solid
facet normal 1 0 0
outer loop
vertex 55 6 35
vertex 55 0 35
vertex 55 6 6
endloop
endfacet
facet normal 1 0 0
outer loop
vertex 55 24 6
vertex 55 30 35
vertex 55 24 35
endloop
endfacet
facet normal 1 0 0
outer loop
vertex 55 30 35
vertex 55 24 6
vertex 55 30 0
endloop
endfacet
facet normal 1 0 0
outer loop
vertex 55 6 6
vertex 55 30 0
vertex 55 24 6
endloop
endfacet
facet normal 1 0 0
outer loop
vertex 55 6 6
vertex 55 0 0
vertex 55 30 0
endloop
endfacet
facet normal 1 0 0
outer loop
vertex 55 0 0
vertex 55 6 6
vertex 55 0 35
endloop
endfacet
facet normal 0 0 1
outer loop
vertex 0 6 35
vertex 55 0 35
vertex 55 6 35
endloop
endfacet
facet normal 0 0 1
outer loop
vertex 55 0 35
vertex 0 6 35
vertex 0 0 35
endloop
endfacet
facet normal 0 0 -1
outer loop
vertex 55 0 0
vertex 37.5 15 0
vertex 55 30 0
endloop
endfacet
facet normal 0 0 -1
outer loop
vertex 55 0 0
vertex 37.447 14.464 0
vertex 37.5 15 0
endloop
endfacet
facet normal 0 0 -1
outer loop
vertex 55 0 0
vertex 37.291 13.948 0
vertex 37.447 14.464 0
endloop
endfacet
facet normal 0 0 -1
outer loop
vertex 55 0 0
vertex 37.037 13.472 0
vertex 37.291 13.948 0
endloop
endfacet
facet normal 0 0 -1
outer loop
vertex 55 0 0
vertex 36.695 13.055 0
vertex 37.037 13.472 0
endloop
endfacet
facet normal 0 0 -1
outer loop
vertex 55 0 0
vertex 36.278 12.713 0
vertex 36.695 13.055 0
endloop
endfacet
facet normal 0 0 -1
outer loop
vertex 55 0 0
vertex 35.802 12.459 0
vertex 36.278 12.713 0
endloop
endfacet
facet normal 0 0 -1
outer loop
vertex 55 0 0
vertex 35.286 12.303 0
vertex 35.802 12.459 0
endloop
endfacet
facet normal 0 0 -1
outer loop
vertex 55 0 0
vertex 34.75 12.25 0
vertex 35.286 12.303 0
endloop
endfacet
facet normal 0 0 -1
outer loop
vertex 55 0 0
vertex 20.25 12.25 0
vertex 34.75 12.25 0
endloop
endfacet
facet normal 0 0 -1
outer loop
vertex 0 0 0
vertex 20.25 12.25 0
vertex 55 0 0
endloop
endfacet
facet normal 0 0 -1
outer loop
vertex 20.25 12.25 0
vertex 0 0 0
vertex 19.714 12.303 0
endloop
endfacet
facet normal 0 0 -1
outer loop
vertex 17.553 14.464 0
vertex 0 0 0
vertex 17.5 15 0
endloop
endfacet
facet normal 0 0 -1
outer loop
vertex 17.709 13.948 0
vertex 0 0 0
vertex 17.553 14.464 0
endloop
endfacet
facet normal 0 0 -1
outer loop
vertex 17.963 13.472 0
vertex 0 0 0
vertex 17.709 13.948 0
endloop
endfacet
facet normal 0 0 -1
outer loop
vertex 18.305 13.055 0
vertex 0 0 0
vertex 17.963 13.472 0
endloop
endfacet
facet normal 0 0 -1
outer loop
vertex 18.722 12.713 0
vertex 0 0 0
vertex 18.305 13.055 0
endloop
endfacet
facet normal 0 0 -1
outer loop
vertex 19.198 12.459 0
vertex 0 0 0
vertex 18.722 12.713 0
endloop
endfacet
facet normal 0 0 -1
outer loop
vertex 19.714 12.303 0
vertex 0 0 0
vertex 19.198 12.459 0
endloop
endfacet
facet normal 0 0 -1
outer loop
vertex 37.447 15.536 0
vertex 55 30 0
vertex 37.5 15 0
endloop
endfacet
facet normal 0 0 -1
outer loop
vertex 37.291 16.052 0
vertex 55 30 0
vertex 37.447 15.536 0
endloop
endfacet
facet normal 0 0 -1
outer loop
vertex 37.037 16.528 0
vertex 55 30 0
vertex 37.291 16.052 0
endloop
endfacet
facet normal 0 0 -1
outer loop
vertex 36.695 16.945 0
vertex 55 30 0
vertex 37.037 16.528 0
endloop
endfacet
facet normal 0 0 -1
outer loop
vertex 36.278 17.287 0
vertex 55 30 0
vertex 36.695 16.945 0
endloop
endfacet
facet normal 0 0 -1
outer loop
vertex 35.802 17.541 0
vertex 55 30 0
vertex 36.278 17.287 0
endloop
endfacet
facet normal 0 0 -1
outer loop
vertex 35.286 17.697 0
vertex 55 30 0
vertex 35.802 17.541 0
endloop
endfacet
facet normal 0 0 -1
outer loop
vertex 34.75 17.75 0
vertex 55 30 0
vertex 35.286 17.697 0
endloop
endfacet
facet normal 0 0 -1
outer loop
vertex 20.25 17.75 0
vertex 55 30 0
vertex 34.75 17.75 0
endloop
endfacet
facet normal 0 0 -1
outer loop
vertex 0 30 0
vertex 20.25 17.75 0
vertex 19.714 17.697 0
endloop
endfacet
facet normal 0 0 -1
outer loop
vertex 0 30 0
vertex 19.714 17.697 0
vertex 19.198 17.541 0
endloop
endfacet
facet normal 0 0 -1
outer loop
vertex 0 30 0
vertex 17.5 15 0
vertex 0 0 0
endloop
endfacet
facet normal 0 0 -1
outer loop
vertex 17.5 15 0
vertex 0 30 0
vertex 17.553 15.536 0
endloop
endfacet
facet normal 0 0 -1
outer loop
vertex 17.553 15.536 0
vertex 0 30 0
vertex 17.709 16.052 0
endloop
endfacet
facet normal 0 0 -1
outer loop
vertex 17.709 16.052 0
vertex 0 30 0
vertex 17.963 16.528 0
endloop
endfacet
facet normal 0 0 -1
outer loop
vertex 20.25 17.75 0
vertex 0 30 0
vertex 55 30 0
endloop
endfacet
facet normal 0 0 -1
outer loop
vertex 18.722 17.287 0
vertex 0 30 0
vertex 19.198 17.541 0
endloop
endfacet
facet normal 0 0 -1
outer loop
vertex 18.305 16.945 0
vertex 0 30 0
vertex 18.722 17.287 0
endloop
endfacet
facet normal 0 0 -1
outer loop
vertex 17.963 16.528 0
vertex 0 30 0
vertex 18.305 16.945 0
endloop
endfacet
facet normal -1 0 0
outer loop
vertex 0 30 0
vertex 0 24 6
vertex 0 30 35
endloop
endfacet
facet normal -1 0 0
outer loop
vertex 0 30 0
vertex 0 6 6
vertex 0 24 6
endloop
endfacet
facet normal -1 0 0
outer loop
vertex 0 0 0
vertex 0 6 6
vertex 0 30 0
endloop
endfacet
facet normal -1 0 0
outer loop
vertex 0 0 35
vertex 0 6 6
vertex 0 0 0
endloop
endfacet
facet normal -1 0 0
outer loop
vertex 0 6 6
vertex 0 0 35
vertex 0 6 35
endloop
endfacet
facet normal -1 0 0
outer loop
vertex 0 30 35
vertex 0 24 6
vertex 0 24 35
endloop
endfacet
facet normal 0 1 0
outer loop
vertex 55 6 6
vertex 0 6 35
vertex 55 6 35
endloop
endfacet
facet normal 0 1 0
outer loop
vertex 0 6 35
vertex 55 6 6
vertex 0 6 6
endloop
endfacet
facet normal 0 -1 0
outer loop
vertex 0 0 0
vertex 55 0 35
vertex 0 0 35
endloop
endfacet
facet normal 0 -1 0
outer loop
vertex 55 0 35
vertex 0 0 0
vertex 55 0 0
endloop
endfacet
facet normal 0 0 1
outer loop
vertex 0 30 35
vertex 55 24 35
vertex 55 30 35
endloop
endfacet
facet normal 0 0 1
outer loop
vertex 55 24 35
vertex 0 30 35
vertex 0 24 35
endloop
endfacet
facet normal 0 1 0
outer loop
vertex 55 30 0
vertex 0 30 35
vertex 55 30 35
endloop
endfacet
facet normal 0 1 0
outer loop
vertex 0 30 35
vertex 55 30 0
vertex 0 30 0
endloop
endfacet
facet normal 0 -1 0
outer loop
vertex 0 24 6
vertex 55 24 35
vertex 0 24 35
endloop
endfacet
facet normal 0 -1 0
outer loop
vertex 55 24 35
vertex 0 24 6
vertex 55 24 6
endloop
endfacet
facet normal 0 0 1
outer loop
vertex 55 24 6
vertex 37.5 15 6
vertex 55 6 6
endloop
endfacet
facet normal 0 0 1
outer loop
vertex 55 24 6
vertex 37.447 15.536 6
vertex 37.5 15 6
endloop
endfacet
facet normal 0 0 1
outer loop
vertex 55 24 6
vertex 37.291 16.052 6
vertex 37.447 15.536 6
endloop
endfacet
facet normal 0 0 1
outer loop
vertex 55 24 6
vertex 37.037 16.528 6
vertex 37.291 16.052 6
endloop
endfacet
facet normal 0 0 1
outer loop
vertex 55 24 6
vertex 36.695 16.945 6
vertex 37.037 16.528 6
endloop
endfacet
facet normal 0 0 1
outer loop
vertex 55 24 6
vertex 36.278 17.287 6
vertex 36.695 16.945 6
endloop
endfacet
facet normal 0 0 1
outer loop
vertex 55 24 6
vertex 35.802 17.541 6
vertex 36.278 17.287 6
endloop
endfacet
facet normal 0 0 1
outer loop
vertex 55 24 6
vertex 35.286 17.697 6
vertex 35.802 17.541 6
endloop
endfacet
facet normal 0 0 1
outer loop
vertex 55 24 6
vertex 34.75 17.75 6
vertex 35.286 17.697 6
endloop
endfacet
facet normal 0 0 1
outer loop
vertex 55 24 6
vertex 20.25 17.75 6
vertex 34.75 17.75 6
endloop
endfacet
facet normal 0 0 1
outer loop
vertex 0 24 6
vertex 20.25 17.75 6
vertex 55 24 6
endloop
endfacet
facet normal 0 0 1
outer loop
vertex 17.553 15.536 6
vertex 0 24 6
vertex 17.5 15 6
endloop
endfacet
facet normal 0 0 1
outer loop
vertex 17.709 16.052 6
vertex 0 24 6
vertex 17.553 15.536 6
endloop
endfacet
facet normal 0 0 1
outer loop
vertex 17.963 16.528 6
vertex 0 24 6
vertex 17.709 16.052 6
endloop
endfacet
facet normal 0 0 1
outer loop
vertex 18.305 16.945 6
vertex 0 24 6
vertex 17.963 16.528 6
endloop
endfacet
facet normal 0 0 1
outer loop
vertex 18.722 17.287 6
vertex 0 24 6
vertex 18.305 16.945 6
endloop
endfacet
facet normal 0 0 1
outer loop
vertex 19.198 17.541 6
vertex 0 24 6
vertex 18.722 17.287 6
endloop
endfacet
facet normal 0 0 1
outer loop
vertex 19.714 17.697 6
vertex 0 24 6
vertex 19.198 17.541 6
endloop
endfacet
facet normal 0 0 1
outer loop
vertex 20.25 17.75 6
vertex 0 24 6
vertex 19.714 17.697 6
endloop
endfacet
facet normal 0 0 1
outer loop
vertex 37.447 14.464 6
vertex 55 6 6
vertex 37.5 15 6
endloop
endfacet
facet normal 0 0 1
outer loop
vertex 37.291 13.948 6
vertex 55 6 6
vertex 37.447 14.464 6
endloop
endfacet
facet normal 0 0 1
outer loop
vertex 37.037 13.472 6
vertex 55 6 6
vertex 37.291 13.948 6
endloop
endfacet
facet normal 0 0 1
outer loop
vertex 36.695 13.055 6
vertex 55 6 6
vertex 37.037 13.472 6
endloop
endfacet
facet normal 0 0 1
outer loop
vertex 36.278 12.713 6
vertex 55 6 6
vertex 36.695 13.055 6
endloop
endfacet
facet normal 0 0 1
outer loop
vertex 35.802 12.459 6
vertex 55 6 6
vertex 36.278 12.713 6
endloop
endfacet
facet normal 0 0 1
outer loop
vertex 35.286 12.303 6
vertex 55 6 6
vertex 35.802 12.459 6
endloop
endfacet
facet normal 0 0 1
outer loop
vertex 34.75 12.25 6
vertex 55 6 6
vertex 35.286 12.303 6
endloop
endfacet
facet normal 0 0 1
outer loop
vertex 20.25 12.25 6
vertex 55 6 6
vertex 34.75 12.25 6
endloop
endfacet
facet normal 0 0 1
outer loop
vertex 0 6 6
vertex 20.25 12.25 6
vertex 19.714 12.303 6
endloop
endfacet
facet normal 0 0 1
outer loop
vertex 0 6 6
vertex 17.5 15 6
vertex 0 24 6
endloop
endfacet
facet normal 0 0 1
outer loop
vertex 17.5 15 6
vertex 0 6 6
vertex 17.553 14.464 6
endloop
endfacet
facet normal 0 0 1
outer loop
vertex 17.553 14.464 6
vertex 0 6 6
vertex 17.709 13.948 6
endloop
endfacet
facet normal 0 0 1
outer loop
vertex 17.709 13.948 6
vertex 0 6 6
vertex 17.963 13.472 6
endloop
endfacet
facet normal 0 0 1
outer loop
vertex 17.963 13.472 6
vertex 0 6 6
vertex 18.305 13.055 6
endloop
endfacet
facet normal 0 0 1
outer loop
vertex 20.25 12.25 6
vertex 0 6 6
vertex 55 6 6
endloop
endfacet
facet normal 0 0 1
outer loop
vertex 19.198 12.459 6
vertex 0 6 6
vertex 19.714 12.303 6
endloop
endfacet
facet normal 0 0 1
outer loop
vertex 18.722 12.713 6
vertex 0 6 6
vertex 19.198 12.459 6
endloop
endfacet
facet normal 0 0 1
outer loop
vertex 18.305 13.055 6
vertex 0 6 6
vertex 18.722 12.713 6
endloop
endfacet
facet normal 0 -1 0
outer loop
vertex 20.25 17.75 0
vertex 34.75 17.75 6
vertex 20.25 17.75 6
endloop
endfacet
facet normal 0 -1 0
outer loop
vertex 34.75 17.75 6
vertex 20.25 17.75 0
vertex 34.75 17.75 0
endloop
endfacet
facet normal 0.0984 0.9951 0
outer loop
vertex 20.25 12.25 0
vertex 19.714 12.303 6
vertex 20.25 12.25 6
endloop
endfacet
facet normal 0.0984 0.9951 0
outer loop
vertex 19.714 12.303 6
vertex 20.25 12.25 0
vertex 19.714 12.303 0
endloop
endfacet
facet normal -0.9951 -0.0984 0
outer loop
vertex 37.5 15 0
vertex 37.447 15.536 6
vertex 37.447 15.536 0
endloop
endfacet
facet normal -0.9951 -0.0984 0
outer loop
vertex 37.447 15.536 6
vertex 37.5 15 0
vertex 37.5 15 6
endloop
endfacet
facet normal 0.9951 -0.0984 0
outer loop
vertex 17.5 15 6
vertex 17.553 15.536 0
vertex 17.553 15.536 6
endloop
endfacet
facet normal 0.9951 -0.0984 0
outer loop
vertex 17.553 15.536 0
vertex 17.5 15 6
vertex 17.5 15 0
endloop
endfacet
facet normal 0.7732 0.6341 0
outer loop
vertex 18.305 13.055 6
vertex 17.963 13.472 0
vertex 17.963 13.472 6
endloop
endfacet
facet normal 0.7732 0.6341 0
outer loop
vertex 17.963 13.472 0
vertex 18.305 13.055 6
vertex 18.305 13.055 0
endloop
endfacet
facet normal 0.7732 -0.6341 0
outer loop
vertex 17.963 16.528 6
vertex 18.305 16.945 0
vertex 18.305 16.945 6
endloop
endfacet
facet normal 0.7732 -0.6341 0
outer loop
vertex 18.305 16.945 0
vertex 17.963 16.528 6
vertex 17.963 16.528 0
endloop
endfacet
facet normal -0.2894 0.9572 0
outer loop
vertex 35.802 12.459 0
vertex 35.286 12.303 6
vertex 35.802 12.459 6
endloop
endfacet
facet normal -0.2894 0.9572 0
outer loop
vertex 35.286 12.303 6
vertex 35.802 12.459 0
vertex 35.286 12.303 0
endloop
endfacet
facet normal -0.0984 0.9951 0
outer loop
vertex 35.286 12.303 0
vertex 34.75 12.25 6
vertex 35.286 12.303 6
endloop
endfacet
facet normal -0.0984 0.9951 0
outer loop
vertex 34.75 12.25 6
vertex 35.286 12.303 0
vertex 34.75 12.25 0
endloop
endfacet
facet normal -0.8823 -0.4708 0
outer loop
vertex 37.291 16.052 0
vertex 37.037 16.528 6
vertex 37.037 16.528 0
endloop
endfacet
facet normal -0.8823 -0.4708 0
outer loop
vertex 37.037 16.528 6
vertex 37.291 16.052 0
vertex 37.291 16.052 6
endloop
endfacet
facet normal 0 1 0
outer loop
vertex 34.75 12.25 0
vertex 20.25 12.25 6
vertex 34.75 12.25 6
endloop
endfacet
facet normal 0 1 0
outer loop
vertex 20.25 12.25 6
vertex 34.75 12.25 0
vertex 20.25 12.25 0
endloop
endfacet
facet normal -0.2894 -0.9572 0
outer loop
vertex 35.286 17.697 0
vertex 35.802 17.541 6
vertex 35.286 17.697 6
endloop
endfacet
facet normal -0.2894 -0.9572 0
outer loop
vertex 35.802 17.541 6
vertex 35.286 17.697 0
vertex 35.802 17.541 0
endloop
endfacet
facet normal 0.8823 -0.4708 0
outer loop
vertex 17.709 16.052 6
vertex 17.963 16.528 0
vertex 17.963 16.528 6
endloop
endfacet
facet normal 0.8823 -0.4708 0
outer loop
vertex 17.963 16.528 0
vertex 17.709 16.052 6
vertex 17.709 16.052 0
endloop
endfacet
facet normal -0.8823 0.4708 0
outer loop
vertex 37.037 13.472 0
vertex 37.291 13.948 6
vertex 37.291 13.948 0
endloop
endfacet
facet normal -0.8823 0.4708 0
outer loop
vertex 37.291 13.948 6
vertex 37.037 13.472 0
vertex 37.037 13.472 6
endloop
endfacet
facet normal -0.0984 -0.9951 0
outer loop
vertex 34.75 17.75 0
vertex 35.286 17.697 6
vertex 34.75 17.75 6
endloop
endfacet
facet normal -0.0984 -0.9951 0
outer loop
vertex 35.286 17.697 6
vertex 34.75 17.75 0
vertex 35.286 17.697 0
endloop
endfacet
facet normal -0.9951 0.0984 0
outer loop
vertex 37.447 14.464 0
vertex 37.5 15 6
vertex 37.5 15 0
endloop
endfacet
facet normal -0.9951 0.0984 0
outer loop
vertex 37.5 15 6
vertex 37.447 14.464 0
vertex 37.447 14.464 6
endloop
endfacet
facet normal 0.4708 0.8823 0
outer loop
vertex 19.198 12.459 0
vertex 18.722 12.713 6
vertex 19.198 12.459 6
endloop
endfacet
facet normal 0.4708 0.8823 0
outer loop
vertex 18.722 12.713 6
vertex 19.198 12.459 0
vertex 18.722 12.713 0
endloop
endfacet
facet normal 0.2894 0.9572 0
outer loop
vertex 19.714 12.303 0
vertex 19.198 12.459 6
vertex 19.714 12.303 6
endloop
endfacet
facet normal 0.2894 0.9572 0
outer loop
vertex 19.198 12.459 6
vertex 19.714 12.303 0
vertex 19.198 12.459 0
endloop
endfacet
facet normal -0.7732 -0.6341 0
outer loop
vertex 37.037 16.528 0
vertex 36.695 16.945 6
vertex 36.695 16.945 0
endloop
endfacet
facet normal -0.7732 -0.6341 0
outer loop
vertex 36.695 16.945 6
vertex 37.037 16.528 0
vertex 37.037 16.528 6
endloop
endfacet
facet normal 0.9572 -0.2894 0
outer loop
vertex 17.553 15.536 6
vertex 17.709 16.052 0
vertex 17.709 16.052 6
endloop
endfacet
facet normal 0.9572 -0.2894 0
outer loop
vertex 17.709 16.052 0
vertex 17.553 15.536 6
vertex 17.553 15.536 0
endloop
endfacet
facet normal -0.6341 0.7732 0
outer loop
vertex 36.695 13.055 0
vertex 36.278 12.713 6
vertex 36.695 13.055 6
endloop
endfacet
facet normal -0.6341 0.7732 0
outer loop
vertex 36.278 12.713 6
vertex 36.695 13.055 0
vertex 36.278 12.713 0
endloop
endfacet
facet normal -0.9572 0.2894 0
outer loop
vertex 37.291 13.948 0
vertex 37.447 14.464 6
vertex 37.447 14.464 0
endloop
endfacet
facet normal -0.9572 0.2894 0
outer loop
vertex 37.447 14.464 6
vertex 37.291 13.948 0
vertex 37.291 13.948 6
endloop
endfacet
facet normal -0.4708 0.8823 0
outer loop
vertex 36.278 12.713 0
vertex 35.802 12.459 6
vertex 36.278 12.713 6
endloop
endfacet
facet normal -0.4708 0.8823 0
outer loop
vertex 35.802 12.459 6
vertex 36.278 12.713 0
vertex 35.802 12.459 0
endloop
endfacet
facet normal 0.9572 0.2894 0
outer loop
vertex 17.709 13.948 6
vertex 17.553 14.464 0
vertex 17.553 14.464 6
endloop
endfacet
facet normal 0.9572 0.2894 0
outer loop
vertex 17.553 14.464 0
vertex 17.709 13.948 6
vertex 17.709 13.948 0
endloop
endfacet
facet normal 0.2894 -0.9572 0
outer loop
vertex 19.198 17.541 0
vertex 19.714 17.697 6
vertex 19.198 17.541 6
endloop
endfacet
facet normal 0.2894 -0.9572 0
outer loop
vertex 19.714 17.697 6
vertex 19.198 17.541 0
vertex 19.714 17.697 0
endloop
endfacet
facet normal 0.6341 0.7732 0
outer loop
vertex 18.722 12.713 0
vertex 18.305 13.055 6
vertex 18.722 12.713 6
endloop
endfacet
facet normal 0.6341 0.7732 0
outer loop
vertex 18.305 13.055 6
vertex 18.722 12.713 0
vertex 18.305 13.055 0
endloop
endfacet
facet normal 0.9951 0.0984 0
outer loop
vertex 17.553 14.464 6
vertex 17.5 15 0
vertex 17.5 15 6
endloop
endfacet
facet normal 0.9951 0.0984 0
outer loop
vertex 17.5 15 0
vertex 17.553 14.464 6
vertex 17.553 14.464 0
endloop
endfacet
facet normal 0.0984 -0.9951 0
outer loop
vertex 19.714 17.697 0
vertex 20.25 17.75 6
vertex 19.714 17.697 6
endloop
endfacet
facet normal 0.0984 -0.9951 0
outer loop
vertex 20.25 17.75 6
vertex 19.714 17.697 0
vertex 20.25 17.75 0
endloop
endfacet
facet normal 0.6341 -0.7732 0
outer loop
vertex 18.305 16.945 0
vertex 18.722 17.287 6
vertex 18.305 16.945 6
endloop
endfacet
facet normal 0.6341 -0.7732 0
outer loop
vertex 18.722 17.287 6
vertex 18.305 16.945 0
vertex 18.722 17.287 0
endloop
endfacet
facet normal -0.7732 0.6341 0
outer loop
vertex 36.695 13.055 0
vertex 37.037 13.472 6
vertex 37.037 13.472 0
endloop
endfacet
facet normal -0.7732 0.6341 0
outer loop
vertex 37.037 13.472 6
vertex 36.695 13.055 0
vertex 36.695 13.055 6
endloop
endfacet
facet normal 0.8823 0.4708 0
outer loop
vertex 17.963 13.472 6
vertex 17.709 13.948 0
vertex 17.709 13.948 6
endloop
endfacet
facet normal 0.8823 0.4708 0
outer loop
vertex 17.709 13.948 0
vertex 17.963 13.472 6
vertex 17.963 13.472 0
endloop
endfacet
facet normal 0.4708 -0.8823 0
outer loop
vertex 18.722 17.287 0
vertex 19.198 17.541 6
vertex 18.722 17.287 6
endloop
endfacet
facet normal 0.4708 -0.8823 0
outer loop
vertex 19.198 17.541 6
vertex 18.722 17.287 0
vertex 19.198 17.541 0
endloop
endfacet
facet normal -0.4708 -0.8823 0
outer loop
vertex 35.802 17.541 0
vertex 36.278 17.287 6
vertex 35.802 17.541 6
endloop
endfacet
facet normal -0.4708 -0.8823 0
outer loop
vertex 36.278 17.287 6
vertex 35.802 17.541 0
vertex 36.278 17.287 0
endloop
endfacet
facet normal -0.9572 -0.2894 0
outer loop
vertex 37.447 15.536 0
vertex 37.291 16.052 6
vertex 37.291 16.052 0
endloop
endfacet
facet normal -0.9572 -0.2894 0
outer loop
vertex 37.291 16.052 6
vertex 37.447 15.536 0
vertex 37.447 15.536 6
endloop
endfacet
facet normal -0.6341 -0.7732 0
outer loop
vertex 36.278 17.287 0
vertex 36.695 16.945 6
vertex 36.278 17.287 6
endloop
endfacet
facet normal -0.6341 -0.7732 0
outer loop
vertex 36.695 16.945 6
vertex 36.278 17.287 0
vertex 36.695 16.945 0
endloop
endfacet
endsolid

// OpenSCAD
$fn = 32;

// ----------------------------------------------------------------------
// U-bracket: 55 x 30 x 35 mm
// ----------------------------------------------------------------------

// --- parameters (mm) ---
base_len = 55;            // outer length, X
channel_w = 30;           // outer width, Y
upright_h = 35;           // upright height, Z
mat_t = 6;                // wall thickness
hole_d = 5.5;             // clearance for M5
slot_l = 20;              // slot length

module hole_z(px, py) {
  translate([px, py, -0.5]) cylinder(h = mat_t + 1, d = hole_d);
}
module hole_y_pz(pz) {
  /* through both uprights along Y */
  translate([0, -0.5, pz]) rotate([-90, 0, 0]) cylinder(h = channel_w + 1, d = hole_d);
}
module slot_z(px, py) {
  hull() {
    translate([px - (slot_l - hole_d) / 2, py, -0.5]) cylinder(h = mat_t + 1, d = hole_d);
    translate([px + (slot_l - hole_d) / 2, py, -0.5]) cylinder(h = mat_t + 1, d = hole_d);
  }
}

module base() {
  cube([base_len, channel_w, mat_t]);
}

module uprights() {
  cube([base_len, mat_t, upright_h]);
  translate([0, channel_w - mat_t, 0]) cube([base_len, mat_t, upright_h]);
}

difference() {
  union() {
    base();
    uprights();
  }
  slot_z(27.5, 15);
}
